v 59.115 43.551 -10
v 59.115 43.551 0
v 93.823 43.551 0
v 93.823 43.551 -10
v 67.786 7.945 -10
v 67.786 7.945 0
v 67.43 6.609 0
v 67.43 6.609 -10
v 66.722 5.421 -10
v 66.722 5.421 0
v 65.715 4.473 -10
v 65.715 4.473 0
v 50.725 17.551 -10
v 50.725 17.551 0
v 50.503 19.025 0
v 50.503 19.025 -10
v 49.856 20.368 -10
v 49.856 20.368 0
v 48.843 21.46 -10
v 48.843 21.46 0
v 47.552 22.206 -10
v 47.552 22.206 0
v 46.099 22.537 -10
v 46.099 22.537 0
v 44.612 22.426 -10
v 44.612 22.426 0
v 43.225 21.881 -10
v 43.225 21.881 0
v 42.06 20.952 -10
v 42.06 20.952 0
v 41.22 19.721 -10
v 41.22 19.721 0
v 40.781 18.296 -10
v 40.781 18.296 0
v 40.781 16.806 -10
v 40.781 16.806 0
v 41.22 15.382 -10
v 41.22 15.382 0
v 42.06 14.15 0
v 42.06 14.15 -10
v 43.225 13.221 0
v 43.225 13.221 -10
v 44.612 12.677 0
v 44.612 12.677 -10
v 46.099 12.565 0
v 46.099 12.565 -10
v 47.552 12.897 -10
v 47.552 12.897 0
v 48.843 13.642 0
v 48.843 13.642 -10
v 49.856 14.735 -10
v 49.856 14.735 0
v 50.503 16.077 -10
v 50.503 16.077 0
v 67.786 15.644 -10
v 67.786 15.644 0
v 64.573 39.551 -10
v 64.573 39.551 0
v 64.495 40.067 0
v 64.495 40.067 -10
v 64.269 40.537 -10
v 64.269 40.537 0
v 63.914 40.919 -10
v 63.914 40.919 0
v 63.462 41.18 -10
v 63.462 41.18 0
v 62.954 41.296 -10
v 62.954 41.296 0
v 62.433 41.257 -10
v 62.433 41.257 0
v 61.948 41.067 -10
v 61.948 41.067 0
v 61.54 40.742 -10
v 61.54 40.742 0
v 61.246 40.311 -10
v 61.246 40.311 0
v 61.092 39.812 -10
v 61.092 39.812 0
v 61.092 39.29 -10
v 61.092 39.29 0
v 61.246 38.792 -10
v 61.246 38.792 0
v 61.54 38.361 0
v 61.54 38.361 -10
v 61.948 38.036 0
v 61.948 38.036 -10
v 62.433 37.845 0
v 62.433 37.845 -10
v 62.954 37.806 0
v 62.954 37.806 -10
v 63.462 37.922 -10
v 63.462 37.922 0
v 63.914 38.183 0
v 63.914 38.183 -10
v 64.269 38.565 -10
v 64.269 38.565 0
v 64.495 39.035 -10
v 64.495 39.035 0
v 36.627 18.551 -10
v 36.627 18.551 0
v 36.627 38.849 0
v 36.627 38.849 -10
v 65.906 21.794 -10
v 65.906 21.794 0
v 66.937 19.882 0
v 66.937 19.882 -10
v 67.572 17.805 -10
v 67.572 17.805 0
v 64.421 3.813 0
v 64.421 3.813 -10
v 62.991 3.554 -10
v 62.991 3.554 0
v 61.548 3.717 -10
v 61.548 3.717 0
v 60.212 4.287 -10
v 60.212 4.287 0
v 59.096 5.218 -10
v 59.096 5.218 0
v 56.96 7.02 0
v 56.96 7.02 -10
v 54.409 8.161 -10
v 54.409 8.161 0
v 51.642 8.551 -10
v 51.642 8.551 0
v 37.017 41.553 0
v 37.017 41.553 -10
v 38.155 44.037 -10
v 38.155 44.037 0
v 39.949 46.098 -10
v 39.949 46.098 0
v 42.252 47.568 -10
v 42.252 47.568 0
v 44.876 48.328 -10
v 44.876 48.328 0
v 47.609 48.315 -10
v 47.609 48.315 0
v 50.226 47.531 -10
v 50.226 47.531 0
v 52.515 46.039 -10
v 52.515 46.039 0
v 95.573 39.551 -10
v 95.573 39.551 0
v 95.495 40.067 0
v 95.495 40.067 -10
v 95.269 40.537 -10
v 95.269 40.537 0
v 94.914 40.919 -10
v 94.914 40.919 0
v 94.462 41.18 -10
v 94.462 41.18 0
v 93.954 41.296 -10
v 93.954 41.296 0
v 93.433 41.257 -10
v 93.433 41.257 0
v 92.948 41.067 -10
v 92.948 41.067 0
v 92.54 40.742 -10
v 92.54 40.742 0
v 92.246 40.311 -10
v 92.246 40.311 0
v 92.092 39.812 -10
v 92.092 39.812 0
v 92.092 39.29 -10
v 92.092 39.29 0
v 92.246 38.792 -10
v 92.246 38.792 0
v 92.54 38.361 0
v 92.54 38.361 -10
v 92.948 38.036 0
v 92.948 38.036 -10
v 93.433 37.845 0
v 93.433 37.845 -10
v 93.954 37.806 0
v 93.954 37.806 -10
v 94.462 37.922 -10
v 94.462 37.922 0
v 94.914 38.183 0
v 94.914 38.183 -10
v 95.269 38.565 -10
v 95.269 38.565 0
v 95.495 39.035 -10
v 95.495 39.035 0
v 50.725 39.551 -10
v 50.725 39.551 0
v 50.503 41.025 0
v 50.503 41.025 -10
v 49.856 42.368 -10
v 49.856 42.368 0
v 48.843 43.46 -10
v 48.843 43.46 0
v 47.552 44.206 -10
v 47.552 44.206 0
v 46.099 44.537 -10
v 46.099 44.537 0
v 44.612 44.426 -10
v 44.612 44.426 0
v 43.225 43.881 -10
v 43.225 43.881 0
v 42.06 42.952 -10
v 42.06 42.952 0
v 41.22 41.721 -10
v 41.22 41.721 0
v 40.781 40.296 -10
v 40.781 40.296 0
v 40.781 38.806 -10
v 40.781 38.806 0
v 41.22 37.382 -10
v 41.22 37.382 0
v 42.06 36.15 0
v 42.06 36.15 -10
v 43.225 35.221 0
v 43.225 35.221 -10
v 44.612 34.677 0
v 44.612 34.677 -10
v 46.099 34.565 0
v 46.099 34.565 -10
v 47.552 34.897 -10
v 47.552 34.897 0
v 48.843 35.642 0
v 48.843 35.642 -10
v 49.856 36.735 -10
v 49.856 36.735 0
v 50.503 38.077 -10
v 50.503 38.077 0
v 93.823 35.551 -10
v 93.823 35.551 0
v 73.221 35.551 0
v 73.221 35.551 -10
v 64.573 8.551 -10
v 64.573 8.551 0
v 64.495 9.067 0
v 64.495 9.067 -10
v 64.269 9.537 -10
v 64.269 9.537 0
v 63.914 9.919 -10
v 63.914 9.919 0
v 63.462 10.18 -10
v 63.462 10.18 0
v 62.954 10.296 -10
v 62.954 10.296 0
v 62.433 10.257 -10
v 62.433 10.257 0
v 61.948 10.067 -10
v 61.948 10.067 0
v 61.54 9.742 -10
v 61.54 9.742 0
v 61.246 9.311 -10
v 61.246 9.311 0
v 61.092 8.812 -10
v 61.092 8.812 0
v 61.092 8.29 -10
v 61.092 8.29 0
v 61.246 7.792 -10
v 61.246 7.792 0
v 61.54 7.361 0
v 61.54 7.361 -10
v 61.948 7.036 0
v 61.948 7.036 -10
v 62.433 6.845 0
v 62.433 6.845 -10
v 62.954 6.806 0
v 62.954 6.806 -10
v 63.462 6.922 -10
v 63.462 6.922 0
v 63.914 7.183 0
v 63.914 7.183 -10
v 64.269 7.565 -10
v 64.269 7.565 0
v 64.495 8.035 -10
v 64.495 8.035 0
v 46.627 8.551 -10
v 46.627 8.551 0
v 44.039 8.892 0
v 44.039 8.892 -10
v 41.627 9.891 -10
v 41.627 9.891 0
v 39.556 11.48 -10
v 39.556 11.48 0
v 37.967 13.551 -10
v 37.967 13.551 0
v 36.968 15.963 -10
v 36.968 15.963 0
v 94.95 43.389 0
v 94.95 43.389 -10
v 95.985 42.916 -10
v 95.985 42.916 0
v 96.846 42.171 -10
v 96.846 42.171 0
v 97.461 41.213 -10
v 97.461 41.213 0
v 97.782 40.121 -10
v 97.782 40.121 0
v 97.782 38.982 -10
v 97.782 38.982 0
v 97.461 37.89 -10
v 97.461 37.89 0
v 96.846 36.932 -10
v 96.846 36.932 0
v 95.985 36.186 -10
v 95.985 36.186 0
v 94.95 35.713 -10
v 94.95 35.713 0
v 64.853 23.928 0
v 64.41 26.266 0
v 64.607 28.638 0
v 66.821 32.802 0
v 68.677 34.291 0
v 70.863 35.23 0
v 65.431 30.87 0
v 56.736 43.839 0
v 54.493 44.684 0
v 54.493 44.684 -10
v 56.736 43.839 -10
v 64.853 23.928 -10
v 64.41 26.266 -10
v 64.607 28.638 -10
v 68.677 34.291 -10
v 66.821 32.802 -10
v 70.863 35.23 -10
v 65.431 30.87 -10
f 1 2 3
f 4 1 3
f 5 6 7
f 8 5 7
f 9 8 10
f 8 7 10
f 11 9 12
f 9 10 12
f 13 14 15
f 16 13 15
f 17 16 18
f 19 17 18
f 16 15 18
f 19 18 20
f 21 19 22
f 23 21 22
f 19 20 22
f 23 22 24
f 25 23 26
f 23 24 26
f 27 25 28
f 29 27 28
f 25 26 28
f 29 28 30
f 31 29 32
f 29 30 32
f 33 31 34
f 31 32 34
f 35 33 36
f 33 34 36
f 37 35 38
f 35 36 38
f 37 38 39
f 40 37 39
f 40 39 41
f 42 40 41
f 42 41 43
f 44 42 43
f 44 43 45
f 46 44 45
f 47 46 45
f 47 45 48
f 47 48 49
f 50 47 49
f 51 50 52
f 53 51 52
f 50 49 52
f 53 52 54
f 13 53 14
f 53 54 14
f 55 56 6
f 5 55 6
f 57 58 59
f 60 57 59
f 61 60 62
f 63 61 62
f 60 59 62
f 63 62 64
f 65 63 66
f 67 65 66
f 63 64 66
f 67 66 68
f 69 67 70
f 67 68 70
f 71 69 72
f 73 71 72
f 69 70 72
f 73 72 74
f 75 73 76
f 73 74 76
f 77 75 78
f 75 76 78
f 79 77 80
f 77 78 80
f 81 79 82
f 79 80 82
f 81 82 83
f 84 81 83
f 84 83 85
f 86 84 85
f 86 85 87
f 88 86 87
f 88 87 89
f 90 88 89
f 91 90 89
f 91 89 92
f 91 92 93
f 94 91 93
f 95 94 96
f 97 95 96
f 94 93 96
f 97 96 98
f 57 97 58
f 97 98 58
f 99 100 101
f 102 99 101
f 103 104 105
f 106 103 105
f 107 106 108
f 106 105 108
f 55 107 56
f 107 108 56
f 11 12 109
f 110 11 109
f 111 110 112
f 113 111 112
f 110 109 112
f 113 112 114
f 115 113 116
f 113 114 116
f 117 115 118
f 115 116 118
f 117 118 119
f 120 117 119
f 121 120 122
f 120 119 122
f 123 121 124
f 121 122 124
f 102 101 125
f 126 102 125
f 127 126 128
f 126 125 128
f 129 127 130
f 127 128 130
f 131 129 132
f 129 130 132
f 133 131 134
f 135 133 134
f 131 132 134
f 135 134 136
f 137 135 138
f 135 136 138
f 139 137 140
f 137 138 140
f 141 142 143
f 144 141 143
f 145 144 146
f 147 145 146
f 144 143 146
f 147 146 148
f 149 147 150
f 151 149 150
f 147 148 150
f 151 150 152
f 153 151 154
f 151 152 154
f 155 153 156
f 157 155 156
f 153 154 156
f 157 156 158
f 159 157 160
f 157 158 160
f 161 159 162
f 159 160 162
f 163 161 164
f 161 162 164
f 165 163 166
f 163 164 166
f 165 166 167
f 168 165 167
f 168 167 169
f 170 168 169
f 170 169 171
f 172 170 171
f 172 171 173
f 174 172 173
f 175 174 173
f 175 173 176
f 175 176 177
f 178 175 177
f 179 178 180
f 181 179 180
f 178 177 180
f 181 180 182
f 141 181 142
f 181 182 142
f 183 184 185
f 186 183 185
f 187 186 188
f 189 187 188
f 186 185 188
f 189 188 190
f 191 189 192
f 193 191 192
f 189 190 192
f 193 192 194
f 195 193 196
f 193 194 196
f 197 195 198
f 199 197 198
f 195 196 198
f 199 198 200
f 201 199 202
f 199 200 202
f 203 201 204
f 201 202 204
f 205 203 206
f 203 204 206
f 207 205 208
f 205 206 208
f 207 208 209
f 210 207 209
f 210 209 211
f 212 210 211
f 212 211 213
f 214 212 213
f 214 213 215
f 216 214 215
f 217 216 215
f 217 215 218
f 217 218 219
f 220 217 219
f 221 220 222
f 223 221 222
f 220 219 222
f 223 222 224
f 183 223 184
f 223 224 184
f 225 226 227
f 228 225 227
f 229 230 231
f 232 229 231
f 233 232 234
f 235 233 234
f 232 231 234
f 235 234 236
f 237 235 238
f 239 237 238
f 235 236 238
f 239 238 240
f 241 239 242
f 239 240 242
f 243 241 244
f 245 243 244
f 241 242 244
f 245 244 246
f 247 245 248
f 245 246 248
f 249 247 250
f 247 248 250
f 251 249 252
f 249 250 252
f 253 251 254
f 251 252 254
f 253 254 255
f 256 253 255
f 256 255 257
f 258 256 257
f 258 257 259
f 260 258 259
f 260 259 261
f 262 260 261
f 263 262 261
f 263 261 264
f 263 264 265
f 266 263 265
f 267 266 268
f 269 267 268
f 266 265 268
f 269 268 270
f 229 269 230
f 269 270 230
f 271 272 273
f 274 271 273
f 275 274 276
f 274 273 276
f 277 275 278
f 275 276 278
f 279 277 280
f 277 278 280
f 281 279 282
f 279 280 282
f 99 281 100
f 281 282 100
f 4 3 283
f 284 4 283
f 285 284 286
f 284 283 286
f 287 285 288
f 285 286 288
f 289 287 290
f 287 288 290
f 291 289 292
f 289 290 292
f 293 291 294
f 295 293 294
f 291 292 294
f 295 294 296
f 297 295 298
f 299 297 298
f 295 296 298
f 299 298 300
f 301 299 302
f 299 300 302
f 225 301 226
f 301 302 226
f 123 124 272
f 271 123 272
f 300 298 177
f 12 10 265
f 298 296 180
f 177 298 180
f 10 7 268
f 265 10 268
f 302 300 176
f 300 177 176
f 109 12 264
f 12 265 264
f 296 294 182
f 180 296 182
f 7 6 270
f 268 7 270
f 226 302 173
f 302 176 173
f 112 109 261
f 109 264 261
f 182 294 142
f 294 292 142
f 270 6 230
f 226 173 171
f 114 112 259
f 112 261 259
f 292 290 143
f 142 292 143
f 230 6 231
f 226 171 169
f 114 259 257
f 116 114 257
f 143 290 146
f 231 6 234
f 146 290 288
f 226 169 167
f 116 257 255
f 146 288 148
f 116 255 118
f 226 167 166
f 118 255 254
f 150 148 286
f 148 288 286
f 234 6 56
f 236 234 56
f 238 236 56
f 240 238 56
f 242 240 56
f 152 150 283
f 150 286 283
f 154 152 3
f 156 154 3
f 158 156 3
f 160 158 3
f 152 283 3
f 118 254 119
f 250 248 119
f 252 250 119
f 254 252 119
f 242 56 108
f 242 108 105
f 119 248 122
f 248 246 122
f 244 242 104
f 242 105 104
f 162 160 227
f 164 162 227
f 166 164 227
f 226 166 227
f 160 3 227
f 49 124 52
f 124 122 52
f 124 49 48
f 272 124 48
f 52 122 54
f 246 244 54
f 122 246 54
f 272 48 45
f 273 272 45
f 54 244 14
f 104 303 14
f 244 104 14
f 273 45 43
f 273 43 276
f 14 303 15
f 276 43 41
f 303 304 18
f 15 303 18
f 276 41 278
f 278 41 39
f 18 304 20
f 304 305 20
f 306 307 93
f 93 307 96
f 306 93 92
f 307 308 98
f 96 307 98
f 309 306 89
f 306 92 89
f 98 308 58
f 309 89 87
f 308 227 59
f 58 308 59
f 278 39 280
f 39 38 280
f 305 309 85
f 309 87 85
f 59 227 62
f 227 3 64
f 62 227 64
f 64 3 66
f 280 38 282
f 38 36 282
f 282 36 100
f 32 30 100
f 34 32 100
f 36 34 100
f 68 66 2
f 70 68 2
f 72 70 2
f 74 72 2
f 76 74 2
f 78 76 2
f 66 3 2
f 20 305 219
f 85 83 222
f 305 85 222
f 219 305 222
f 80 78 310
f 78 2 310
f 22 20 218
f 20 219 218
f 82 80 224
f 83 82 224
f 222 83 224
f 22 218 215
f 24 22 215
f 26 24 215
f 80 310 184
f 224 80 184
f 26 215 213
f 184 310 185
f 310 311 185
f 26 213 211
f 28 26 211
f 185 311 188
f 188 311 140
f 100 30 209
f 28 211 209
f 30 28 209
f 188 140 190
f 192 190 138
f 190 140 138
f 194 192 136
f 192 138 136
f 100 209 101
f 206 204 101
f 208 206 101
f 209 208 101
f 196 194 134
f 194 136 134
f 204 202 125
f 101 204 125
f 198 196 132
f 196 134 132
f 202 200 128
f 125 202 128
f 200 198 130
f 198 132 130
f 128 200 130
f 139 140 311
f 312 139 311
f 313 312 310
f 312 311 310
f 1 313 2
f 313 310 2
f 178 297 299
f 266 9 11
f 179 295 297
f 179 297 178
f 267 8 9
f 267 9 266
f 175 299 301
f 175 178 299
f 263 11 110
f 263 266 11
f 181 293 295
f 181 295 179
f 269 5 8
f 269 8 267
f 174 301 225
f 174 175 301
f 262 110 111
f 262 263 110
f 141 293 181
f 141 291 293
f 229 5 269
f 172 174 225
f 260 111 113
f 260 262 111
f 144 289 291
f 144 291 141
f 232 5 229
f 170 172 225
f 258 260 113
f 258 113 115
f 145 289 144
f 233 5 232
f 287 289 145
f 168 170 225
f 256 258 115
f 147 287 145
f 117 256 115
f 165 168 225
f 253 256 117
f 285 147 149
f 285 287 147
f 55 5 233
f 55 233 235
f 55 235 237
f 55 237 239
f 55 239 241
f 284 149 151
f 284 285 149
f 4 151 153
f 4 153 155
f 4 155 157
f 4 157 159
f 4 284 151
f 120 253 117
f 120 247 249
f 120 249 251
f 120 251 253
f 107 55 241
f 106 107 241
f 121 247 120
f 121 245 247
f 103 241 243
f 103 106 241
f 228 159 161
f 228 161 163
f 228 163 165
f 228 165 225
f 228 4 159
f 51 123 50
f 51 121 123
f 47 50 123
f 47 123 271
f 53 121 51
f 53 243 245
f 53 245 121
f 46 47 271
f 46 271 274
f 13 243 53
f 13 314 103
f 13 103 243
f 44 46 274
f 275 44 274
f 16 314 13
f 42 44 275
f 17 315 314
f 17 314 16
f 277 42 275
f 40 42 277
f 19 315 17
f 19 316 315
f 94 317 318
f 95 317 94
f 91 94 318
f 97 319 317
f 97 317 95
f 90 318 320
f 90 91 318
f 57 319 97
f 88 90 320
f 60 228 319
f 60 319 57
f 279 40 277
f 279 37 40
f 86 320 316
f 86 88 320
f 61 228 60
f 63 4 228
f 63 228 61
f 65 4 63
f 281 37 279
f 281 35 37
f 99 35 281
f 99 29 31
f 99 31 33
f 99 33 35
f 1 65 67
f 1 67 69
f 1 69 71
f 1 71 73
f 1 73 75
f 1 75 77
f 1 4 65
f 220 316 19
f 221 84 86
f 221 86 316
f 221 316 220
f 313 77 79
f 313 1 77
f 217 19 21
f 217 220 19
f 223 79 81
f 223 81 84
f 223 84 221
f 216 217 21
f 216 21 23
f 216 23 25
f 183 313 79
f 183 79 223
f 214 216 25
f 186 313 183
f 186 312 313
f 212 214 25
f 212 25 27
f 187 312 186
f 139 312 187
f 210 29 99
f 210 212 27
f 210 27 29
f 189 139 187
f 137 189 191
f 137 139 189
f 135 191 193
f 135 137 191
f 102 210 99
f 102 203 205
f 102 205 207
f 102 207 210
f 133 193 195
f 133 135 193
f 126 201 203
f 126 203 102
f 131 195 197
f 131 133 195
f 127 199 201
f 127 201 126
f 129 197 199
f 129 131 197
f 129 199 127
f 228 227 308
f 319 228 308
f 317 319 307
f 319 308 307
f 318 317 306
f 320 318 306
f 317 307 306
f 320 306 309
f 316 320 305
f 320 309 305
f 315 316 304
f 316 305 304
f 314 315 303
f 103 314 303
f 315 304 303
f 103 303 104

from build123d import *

# Parameters (mm, degrees)
SKETCH1_R           = 1.75
SKETCH1_R_2         = 5
BOSS_EXTRUDE1_DEPTH = 10


with BuildPart() as part:
    # Sketch1 → Boss-Extrude1 (new body)
    with BuildSketch(Plane.XY):
        with BuildLine():
            Line((59.115327383, 43.551262968), (93.822811009, 43.551262968))
            ThreePointArc((93.822811009, 43.551262968), (97.822811009, 39.551262968), (93.822811009, 35.551262968))
            Line((93.822811009, 35.551262968), (73.221068218, 35.551262968))
            ThreePointArc((73.221068218, 35.551262968), (65.430500205, 30.870379763), (65.905746743, 21.794160382))
            ThreePointArc((65.905746743, 21.794160382), (67.305407589, 18.859363547), (67.785956814, 15.64359686))
            Line((67.785956814, 15.64359686), (67.785956814, 7.945306105))
            ThreePointArc((67.785956814, 7.945306105), (67.117243875, 5.990433735), (65.715264602, 4.47281814))
            ThreePointArc((65.715264602, 4.47281814), (62.263505272, 3.582643734), (59.096031047, 5.217929635))
            ThreePointArc((59.096031047, 5.217929635), (55.724954026, 7.67997226), (51.642471122, 8.551262968))
            Line((51.642471122, 8.551262968), (46.626949913, 8.551262968))
            ThreePointArc((46.626949913, 8.551262968), (39.555882101, 11.480195156), (36.626949913, 18.551262968))
            Line((36.626949913, 18.551262968), (36.626949913, 38.848632096))
            ThreePointArc((36.626949913, 38.848632096), (42.251881835, 47.568318218), (52.515088487, 46.03881686))
            ThreePointArc((52.515088487, 46.03881686), (55.588605185, 44.19379373), (59.115327383, 43.551262968))
        make_face()
        with Locations((93.822811009, 39.551262968)):
            Circle(SKETCH1_R, mode=Mode.SUBTRACT)
        with Locations((62.822811009, 39.551262968)):
            Circle(SKETCH1_R, mode=Mode.SUBTRACT)
        with Locations((62.822811009, 8.551262968)):
            Circle(SKETCH1_R, mode=Mode.SUBTRACT)
        with Locations((45.725055781, 39.551262968)):
            Circle(SKETCH1_R_2, mode=Mode.SUBTRACT)
        with Locations((45.725055781, 17.551264875)):
            Circle(SKETCH1_R_2, mode=Mode.SUBTRACT)
    extrude(amount=-BOSS_EXTRUDE1_DEPTH)


solid = part.part
